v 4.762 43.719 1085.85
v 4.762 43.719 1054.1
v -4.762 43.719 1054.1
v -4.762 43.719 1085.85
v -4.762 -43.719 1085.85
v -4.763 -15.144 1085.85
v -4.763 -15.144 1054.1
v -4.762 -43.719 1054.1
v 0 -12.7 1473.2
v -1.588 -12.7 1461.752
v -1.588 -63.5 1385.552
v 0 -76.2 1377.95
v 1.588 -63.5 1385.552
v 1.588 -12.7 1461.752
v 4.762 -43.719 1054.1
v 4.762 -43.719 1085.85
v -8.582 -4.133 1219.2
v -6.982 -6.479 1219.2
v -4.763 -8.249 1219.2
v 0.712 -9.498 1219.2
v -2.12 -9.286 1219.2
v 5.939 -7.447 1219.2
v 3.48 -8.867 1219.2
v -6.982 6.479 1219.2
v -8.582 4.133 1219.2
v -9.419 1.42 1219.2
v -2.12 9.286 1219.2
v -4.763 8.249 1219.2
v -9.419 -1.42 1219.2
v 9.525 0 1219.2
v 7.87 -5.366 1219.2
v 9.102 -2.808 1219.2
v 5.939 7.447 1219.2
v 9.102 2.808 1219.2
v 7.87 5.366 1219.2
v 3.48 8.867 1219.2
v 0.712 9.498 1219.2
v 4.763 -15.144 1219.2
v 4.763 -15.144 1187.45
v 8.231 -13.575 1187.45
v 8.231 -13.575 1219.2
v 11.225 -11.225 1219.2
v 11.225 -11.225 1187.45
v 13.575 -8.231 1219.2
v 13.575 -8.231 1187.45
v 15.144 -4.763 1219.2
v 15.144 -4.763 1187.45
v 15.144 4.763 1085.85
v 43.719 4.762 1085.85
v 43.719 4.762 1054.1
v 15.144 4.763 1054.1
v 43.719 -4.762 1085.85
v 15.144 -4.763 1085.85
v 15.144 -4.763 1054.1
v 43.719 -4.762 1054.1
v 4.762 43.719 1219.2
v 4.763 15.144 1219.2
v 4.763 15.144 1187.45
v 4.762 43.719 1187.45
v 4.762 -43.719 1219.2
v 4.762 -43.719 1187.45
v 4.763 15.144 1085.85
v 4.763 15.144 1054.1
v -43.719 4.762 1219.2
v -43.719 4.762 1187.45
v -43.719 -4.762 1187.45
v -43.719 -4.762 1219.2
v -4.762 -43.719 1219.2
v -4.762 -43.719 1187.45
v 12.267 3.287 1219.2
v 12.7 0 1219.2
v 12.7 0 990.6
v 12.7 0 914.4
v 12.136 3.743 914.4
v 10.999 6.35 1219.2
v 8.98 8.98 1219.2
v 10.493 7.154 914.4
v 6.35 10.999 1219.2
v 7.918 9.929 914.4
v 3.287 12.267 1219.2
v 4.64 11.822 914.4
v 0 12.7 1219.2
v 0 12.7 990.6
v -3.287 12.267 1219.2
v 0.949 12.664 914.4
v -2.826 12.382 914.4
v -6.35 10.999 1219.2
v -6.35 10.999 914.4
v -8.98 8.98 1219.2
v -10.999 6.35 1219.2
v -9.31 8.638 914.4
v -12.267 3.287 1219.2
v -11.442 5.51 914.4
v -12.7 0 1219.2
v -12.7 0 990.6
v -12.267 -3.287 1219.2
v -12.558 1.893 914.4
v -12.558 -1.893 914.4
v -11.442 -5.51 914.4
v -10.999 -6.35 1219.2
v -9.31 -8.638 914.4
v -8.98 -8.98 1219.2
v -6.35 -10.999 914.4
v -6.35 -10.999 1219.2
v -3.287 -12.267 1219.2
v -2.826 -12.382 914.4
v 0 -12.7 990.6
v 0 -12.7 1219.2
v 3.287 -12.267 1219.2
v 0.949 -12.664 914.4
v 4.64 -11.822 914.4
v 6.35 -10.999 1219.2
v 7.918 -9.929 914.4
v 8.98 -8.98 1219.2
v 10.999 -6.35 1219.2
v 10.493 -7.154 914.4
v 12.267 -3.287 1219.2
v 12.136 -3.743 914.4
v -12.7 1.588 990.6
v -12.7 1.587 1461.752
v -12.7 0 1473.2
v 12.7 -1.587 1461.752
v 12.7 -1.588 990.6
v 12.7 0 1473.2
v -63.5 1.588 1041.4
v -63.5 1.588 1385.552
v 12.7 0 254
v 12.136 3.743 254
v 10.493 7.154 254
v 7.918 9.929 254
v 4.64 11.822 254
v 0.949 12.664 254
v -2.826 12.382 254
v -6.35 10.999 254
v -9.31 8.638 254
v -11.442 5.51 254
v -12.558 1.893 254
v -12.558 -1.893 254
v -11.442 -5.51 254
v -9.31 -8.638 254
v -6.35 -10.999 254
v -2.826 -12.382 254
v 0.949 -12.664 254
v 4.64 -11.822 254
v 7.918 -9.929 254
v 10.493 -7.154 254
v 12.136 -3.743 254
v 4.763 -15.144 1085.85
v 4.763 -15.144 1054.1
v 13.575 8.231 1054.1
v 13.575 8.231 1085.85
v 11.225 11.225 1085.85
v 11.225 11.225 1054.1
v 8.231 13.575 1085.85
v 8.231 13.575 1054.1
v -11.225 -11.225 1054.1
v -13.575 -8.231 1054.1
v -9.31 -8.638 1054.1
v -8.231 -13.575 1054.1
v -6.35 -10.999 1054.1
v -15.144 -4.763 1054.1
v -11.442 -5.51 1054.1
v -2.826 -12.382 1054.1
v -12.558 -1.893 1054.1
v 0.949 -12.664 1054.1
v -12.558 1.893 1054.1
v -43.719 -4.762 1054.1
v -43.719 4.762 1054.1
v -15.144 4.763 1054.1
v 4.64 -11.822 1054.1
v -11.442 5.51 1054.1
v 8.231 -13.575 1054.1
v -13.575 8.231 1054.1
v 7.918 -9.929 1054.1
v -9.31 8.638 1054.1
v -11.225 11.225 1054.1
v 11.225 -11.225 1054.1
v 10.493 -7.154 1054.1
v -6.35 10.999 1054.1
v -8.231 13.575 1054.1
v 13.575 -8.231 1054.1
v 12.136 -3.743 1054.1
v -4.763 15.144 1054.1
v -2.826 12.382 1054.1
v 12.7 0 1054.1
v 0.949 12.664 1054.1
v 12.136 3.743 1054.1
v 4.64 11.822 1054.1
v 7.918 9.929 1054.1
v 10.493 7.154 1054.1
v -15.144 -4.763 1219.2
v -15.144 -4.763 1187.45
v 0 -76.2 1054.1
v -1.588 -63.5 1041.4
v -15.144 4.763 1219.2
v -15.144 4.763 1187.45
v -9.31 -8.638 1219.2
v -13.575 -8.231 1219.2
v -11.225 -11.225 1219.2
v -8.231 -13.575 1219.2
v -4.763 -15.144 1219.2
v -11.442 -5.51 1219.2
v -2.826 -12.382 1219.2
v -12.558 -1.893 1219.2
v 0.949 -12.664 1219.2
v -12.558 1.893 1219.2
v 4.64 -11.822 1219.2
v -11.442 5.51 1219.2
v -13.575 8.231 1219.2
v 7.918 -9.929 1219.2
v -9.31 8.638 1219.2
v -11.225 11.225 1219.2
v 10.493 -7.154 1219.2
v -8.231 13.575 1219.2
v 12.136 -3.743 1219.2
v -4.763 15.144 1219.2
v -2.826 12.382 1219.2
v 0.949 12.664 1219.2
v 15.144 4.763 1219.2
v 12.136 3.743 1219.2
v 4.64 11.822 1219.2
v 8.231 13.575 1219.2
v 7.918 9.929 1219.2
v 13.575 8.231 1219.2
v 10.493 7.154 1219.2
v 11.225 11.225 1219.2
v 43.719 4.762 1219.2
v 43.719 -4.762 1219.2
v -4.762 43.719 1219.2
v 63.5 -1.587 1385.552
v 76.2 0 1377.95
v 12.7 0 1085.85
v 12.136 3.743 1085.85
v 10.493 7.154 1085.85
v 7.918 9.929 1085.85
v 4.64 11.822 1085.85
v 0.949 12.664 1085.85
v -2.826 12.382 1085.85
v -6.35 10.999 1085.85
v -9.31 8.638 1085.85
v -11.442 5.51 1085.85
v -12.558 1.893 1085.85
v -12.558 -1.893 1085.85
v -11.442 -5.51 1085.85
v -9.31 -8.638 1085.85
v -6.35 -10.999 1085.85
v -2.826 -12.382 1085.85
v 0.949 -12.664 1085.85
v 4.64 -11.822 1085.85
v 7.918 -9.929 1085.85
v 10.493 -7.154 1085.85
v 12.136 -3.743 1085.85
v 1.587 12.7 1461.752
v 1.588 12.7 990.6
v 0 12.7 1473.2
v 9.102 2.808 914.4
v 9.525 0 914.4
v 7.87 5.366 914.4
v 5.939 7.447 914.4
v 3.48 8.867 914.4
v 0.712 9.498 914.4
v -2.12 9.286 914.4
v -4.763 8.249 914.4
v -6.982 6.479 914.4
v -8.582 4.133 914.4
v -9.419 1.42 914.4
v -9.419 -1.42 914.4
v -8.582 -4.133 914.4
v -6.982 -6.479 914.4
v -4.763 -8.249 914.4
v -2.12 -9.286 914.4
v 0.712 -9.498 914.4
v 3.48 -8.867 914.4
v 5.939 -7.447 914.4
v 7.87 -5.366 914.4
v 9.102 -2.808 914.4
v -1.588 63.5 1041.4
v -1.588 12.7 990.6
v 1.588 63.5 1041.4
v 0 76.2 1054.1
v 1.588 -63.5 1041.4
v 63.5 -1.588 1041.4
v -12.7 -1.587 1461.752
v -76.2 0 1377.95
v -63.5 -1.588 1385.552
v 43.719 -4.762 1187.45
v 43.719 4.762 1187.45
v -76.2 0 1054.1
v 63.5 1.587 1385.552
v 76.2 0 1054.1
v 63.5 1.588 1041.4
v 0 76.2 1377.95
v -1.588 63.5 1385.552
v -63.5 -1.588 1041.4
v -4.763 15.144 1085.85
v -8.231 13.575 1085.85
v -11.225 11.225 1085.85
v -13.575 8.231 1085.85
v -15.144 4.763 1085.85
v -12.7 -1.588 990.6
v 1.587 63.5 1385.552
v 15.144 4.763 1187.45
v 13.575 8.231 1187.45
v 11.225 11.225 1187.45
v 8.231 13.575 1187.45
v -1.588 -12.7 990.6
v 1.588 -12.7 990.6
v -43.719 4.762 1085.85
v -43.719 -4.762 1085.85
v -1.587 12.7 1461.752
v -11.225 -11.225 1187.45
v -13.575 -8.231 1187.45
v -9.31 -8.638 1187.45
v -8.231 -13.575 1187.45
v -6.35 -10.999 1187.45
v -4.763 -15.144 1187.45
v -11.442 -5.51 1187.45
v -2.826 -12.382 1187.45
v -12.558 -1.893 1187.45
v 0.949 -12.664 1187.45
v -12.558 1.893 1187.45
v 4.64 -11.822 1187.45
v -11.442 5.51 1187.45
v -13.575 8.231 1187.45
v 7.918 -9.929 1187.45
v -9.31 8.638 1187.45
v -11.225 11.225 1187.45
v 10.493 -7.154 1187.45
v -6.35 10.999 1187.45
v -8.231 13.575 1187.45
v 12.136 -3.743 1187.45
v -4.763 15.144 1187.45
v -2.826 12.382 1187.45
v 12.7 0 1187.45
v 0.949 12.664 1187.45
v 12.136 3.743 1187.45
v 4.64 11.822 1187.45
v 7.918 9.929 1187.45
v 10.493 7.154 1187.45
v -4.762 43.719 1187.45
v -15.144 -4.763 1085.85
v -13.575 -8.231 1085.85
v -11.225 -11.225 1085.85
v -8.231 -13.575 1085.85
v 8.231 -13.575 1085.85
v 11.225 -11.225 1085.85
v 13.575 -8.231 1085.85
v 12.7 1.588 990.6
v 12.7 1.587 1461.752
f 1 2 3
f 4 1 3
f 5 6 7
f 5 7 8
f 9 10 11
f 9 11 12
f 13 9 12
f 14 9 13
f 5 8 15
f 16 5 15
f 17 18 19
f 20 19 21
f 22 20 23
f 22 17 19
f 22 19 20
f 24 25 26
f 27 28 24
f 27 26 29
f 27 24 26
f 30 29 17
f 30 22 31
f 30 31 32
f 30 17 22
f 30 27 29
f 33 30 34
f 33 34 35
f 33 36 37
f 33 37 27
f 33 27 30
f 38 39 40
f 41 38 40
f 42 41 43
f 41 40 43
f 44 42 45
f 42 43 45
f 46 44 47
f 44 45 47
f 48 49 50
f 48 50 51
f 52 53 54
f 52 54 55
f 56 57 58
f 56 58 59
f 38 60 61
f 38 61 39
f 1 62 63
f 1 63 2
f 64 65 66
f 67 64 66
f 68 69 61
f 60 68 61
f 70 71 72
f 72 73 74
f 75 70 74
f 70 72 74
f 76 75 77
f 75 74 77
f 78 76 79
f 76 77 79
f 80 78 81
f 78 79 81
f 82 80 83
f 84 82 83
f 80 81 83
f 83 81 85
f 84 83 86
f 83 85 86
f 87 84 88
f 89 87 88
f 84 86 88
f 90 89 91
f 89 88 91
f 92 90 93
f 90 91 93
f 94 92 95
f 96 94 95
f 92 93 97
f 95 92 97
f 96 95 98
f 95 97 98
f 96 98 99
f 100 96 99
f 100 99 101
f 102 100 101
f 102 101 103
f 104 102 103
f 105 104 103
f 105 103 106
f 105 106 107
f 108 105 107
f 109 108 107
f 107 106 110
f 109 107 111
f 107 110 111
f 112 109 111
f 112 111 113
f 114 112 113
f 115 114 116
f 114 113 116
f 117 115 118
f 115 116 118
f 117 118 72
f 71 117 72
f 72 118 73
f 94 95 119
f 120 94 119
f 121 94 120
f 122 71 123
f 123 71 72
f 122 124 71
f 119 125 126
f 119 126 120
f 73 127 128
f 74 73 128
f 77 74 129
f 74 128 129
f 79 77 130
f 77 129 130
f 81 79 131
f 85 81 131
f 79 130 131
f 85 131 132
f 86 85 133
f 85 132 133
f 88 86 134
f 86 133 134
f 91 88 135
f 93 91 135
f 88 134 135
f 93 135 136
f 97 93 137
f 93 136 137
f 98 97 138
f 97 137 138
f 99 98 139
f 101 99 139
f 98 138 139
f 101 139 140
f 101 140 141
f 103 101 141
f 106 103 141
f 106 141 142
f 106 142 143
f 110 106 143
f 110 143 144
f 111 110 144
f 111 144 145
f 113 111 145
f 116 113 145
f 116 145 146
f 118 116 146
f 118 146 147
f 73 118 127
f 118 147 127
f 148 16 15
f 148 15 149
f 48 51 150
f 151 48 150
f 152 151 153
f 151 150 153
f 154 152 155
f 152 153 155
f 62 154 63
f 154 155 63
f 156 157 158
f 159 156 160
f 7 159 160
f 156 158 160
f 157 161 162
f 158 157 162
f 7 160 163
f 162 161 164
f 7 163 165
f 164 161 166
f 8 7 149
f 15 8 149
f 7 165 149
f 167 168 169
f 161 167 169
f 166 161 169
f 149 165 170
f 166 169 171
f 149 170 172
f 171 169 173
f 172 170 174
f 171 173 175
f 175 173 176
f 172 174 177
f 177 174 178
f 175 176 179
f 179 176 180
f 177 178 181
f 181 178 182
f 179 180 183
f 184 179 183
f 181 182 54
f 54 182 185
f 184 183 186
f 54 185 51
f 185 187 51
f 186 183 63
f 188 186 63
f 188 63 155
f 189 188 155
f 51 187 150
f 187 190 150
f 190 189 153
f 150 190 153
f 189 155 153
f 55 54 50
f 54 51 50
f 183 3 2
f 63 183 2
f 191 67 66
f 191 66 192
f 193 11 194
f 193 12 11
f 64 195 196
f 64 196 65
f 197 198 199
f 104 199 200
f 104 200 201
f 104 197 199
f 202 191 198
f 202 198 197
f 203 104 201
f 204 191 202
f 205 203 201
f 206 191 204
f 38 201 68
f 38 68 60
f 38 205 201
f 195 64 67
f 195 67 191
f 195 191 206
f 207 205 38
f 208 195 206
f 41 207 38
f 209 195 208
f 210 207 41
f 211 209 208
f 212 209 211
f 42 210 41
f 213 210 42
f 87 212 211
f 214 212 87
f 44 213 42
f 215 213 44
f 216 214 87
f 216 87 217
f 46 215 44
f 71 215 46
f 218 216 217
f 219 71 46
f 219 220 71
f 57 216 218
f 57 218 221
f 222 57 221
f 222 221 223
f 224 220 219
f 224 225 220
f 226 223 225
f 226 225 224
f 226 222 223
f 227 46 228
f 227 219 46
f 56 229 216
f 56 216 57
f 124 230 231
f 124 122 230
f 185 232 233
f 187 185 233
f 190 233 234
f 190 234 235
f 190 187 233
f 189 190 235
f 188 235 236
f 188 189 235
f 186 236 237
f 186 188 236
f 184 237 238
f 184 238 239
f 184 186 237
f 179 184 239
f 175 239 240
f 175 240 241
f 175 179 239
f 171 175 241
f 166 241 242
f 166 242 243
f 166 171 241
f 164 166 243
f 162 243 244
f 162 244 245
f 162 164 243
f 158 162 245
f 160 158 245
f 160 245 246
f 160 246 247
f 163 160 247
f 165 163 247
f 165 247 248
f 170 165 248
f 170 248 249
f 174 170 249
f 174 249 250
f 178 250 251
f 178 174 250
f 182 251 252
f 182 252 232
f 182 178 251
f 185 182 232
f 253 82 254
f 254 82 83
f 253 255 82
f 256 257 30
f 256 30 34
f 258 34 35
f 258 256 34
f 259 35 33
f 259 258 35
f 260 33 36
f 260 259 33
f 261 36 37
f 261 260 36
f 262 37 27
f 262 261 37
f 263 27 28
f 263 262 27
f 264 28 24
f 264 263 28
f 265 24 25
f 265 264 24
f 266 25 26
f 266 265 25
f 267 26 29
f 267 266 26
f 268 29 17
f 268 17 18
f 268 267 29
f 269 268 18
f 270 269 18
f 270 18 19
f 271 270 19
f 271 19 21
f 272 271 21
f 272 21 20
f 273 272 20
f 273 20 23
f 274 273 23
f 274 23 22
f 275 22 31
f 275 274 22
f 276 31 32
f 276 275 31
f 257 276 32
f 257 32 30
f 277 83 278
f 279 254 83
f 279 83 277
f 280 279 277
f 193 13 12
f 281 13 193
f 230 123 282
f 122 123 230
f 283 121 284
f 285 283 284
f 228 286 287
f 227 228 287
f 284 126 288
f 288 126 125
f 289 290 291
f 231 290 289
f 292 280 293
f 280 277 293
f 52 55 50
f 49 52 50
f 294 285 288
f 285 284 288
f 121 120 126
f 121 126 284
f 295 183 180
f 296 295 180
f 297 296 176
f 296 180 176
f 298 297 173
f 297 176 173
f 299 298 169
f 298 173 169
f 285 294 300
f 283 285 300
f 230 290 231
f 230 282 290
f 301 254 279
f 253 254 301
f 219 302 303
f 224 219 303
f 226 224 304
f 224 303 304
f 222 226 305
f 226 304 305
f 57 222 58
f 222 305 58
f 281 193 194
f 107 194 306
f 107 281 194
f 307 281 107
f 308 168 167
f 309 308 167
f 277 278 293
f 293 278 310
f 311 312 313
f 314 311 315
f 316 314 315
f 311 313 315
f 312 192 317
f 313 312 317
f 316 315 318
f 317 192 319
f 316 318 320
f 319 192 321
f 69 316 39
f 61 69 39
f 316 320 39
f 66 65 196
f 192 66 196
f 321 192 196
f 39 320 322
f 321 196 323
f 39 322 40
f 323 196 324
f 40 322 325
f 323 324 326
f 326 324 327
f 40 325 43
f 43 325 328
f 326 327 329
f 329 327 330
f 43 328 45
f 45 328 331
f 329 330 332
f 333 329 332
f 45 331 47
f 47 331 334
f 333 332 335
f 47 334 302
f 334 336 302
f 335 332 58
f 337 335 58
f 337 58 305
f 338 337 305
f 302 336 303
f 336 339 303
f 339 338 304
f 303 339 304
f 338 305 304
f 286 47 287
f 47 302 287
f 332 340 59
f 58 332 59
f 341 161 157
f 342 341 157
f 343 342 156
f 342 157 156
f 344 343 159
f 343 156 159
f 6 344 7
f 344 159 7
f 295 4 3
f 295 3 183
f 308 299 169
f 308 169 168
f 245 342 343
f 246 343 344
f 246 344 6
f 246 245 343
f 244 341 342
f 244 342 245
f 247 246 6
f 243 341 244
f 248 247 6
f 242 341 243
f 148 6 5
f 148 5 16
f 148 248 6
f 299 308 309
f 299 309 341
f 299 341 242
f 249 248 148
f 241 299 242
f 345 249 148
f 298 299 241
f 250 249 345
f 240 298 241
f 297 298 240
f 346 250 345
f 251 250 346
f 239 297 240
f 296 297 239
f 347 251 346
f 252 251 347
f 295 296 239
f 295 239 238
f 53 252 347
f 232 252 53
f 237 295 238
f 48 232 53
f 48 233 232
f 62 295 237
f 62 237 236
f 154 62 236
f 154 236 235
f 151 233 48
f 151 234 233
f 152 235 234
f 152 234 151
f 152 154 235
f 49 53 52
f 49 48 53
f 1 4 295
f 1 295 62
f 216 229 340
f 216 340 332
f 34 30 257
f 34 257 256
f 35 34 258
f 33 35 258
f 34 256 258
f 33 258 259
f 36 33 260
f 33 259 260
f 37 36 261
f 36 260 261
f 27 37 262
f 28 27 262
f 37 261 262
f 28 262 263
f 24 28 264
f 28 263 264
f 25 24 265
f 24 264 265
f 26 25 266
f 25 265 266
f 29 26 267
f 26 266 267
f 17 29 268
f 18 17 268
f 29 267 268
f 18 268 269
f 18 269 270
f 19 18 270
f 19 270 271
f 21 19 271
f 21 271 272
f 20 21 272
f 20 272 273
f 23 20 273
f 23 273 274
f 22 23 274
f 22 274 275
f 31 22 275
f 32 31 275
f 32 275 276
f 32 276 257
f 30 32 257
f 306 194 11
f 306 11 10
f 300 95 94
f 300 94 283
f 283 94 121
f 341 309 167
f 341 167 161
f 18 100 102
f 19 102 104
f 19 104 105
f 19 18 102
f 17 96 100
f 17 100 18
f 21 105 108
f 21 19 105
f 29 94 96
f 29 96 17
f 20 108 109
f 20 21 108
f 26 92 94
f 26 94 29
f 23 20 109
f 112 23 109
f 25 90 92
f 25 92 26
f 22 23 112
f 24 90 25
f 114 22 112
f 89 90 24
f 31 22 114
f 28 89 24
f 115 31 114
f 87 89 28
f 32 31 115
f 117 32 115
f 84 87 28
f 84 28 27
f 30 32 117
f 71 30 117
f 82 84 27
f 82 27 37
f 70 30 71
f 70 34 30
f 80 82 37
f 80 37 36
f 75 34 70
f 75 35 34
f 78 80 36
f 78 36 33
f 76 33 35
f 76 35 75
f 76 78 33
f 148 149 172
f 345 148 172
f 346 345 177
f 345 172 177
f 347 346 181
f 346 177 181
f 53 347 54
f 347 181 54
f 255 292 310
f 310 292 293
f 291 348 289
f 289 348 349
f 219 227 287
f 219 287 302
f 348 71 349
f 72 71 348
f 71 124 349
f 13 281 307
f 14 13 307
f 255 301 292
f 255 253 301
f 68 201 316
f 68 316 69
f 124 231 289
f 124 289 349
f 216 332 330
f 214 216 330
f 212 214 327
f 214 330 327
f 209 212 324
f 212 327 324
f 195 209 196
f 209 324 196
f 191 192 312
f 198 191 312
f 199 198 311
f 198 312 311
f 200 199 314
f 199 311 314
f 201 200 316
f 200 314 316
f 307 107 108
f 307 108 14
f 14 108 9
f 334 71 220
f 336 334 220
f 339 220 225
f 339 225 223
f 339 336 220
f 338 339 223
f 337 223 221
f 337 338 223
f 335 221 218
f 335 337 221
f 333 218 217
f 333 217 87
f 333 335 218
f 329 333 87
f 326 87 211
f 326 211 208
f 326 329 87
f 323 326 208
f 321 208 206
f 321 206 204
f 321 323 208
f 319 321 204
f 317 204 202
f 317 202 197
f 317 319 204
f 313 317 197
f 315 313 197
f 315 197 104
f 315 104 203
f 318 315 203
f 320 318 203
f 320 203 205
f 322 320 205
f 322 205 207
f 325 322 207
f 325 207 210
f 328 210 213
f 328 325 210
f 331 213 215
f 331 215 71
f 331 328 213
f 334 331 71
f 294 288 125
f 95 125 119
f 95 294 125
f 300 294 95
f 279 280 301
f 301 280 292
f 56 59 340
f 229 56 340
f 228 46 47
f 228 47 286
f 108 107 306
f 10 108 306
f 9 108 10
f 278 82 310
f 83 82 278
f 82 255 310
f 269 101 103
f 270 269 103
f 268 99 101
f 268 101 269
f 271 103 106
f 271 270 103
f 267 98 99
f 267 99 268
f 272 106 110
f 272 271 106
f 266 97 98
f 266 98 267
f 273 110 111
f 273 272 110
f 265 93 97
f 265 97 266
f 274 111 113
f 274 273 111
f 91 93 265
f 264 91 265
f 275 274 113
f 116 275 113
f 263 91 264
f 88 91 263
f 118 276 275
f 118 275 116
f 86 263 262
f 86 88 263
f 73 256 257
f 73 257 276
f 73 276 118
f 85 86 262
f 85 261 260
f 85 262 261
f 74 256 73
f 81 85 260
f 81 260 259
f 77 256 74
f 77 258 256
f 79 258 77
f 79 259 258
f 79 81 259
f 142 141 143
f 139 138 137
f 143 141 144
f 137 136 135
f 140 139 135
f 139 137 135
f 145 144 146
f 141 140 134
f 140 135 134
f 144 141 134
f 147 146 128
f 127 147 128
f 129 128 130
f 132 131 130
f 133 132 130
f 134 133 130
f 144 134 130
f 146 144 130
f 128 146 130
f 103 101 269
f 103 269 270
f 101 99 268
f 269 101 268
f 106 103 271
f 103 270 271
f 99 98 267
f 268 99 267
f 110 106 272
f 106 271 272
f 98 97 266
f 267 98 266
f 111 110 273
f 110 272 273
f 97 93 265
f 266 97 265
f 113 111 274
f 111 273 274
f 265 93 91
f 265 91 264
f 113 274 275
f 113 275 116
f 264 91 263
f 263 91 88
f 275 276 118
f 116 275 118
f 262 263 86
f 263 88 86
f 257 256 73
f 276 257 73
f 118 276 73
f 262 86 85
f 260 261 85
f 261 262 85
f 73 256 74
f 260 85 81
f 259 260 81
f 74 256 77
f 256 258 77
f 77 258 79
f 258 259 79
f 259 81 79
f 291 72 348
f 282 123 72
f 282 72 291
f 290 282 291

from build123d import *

# Parameters (mm, degrees)
F1_START      = 254
F0_R          = 12.7
F0_R_2        = 9.525
F1_DEPTH      = 660.4
F2_START      = 254
F2_DEPTH      = 965.2
F3_START      = 914.4
F3_DEPTH      = 304.8
F5_DEPTH      = 1.5875
F5_DEPTH_BACK = 1.5875
F7_DEPTH      = 1.5875
F7_DEPTH_BACK = 1.5875
F9_START      = 1054.1
F8_R          = 12.7
F9_DEPTH      = 31.75
F10_START     = 1187.45
F10_DEPTH     = 31.75
F11_SIZE2     = 12.7
F11_SIZE      = 1.5875
F11_2_SIZE2   = 12.7
F11_2_SIZE    = 1.5875
F11_3_SIZE2   = 12.7
F11_3_SIZE    = 1.5875
F11_4_SIZE2   = 12.7
F11_4_SIZE    = 1.5875
F12_SIZE2     = 1.58749
F12_SIZE      = 12.69999
F12_2_SIZE2   = 1.58749
F12_2_SIZE    = 12.69999
F12_3_SIZE2   = 1.58749
F12_3_SIZE    = 12.69999
F12_4_SIZE2   = 1.58749
F12_4_SIZE    = 12.69999
F13_SIZE2     = 1.58749
F13_SIZE      = 6.34999
F13_2_SIZE2   = 1.5875
F13_2_SIZE    = 6.35
F13_3_SIZE2   = 1.58749
F13_3_SIZE    = 6.34999
F13_4_SIZE2   = 1.5875
F13_4_SIZE    = 6.35
F14_SIZE2     = 6.35
F14_SIZE      = 1.5875
F14_2_SIZE2   = 6.34999
F14_2_SIZE    = 1.58749
F14_3_SIZE2   = 6.35
F14_3_SIZE    = 1.5875
F14_4_SIZE2   = 6.34999
F14_4_SIZE    = 1.58749


# Not quite as in the source:
# - a fillet or chamfer is up to 0.001 mm smaller than in the source, because OpenCascade refuses the exact size


with BuildPart() as f1:
    # F0 (on Top) → F1 (new body)
    with BuildSketch(Plane.XY.offset(F1_START)):
        Circle(F0_R)
        Circle(F0_R_2, mode=Mode.SUBTRACT)
    extrude(amount=F1_DEPTH)

    # F0 (on Top) → F2 (join)
    with BuildSketch(Plane.XY.offset(F2_START)):
        Circle(F0_R_2)
    extrude(amount=F2_DEPTH)


with BuildPart() as f3:
    # F0 (on Top) → F3 (new body)
    with BuildSketch(Plane.XY.offset(F3_START)):
        Circle(F0_R)
        Circle(F0_R_2, mode=Mode.SUBTRACT)
    extrude(amount=F3_DEPTH)

    # F4 (on Front) → F5 (join, two sides)
    with BuildSketch(Plane.XZ) as f5_sk:
        Polygon((-12.7, 990.6), (-12.7, 1473.2), (-76.2, 1377.95), (-76.2, 1054.1), align=None)
        Polygon((76.2, 1377.95), (12.7, 1473.2), (12.7, 990.6), (76.2, 1054.1), align=None)
    extrude(amount=F5_DEPTH)
    extrude(f5_sk.sketch, amount=-F5_DEPTH_BACK)

    # F6 (on Right) → F7 (join, two sides)
    with BuildSketch(Plane.YZ) as f7_sk:
        Polygon((-76.2, 1054.1), (-12.7, 990.6), (-12.7, 1473.2), (-76.2, 1377.95), align=None)
        Polygon((12.7, 1473.2), (12.7, 990.6), (76.2, 1054.1), (76.2, 1377.95), align=None)
    extrude(amount=F7_DEPTH)
    extrude(f7_sk.sketch, amount=-F7_DEPTH_BACK)

    # F11
    f11_edges = [f3.edges().sort_by_distance(p)[0] for p in [
        (76.2, -1.5875, 1216.025),
    ]]
    f11_side = f3.faces().sort_by_distance((76.2, 0, 1216.025))[0]
    chamfer(f11_edges, length=F11_SIZE, length2=F11_SIZE2, reference=f11_side)

    # F11#2
    f11_2_edges = [f3.edges().sort_by_distance(p)[0] for p in [
        (1.5875, -76.2, 1216.025),
    ]]
    f11_2_side = f3.faces().sort_by_distance((0, -76.2, 1216.025))[0]
    chamfer(f11_2_edges, length=F11_2_SIZE, length2=F11_2_SIZE2, reference=f11_2_side)

    # F11#3
    f11_3_edges = [f3.edges().sort_by_distance(p)[0] for p in [
        (-76.2, 1.5875, 1216.025),
    ]]
    f11_3_side = f3.faces().sort_by_distance((-76.2, 0, 1216.025))[0]
    chamfer(f11_3_edges, length=F11_3_SIZE, length2=F11_3_SIZE2, reference=f11_3_side)

    # F11#4
    f11_4_edges = [f3.edges().sort_by_distance(p)[0] for p in [
        (-1.5875, 76.2, 1216.025),
    ]]
    f11_4_side = f3.faces().sort_by_distance((0, 76.2, 1216.025))[0]
    chamfer(f11_4_edges, length=F11_4_SIZE, length2=F11_4_SIZE2, reference=f11_4_side)

    # F12 (size 12.7 and 1.5875 in the source; OpenCascade refuses exactly that, so slightly less here)
    f12_edges = [f3.edges().sort_by_distance(p)[0] for p in [
        (-1.5875, -76.2, 1216.025),
    ]]
    f12_side = f3.faces().sort_by_distance((-1.5875, -42.366667, 1224.483333))[0]
    chamfer(f12_edges, length=F12_SIZE, length2=F12_SIZE2, reference=f12_side)

    # F12#2 (size 12.7 and 1.5875 in the source; OpenCascade refuses exactly that, so slightly less here)
    f12_2_edges = [f3.edges().sort_by_distance(p)[0] for p in [
        (-76.2, -1.5875, 1216.025),
    ]]
    f12_2_side = f3.faces().sort_by_distance((-42.366667, -1.5875, 1224.483333))[0]
    chamfer(f12_2_edges, length=F12_2_SIZE, length2=F12_2_SIZE2, reference=f12_2_side)

    # F12#3 (size 12.7 and 1.5875 in the source; OpenCascade refuses exactly that, so slightly less here)
    f12_3_edges = [f3.edges().sort_by_distance(p)[0] for p in [
        (1.5875, 76.2, 1216.025),
    ]]
    f12_3_side = f3.faces().sort_by_distance((1.5875, 42.366667, 1224.483333))[0]
    chamfer(f12_3_edges, length=F12_3_SIZE, length2=F12_3_SIZE2, reference=f12_3_side)

    # F12#4 (size 12.7 and 1.5875 in the source; OpenCascade refuses exactly that, so slightly less here)
    f12_4_edges = [f3.edges().sort_by_distance(p)[0] for p in [
        (76.2, 1.5875, 1216.025),
    ]]
    f12_4_side = f3.faces().sort_by_distance((42.366667, 1.5875, 1224.483333))[0]
    chamfer(f12_4_edges, length=F12_4_SIZE, length2=F12_4_SIZE2, reference=f12_4_side)

    # F13 (size 6.35 and 1.5875 in the source; OpenCascade refuses exactly that, so slightly less here)
    f13_edges = [f3.edges().sort_by_distance(p)[0] for p in [
        (38.100005, 1.5875, 1435.099993),
    ]]
    f13_side = f3.faces().sort_by_distance((36.817176, 1.5875, 1225.870706))[0]
    chamfer(f13_edges, length=F13_SIZE, length2=F13_SIZE2, reference=f13_side)

    # F13#2
    f13_2_edges = [f3.edges().sort_by_distance(p)[0] for p in [
        (-1.5875, 38.1, 1435.1),
    ]]
    f13_2_side = f3.faces().sort_by_distance((-1.5875, 36.817172, 1225.870707))[0]
    chamfer(f13_2_edges, length=F13_2_SIZE, length2=F13_2_SIZE2, reference=f13_2_side)

    # F13#3 (size 6.35 and 1.5875 in the source; OpenCascade refuses exactly that, so slightly less here)
    f13_3_edges = [f3.edges().sort_by_distance(p)[0] for p in [
        (-38.100005, -1.5875, 1435.099993),
    ]]
    f13_3_side = f3.faces().sort_by_distance((-36.817176, -1.5875, 1225.870706))[0]
    chamfer(f13_3_edges, length=F13_3_SIZE, length2=F13_3_SIZE2, reference=f13_3_side)

    # F13#4
    f13_4_edges = [f3.edges().sort_by_distance(p)[0] for p in [
        (1.5875, -38.1, 1435.1),
    ]]
    f13_4_side = f3.faces().sort_by_distance((1.5875, -36.817172, 1225.870707))[0]
    chamfer(f13_4_edges, length=F13_4_SIZE, length2=F13_4_SIZE2, reference=f13_4_side)

    # F14
    f14_edges = [f3.edges().sort_by_distance(p)[0] for p in [
        (38.1, -1.5875, 1435.1),
    ]]
    f14_side = f3.faces().sort_by_distance((41.392614, -0.764347, 1430.161079))[0]
    chamfer(f14_edges, length=F14_SIZE, length2=F14_SIZE2, reference=f14_side)

    # F14#2 (size 1.5875 and 6.35 in the source; OpenCascade refuses exactly that, so slightly less here)
    f14_2_edges = [f3.edges().sort_by_distance(p)[0] for p in [
        (-1.5875, -38.100005, 1435.099993),
    ]]
    f14_2_side = f3.faces().sort_by_distance((-0.764352, -41.392616, 1430.161076))[0]
    chamfer(f14_2_edges, length=F14_2_SIZE, length2=F14_2_SIZE2, reference=f14_2_side)

    # F14#3
    f14_3_edges = [f3.edges().sort_by_distance(p)[0] for p in [
        (-38.1, 1.5875, 1435.1),
    ]]
    f14_3_side = f3.faces().sort_by_distance((-41.392614, 0.764347, 1430.161079))[0]
    chamfer(f14_3_edges, length=F14_3_SIZE, length2=F14_3_SIZE2, reference=f14_3_side)

    # F14#4 (size 1.5875 and 6.35 in the source; OpenCascade refuses exactly that, so slightly less here)
    f14_4_edges = [f3.edges().sort_by_distance(p)[0] for p in [
        (1.5875, 38.100005, 1435.099993),
    ]]
    f14_4_side = f3.faces().sort_by_distance((0.764352, 41.392616, 1430.161076))[0]
    chamfer(f14_4_edges, length=F14_4_SIZE, length2=F14_4_SIZE2, reference=f14_4_side)


with BuildPart() as f9:
    # F8 (on Top) → F9 (new body)
    with BuildSketch(Plane.XY.offset(F9_START)):
        with BuildLine():
            Line((43.7187848225, 4.7625), (15.1437848225, 4.7625))
            ThreePointArc((15.1437848225, 4.7625), (11.2253201513, 11.2253201513), (4.7625, 15.1437848225))
            Line((4.7625, 15.1437848225), (4.7625, 43.7187848225))
            Line((4.7625, 43.7187848225), (-4.7625, 43.7187848225))
            Line((-4.7625, 43.7187848225), (-4.7625, 15.1437848225))
            ThreePointArc((-4.7625, 15.1437848225), (-11.2253201513, 11.2253201513), (-15.1437848225, 4.7625))
            Line((-15.1437848225, 4.7625), (-43.7187848225, 4.7625))
            Line((-43.7187848225, 4.7625), (-43.7187848225, -4.7625))
            Line((-43.7187848225, -4.7625), (-15.1437848225, -4.7625))
            ThreePointArc((-15.1437848225, -4.7625), (-11.2253201513, -11.2253201513), (-4.7625, -15.1437848225))
            Line((-4.7625, -15.1437848225), (-4.7625, -43.7187848225))
            Line((-4.7625, -43.7187848225), (4.7625, -43.7187848225))
            Line((4.7625, -43.7187848225), (4.7625, -15.1437848225))
            ThreePointArc((4.7625, -15.1437848225), (11.2253201513, -11.2253201513), (15.1437848225, -4.7625))
            Line((15.1437848225, -4.7625), (43.7187848225, -4.7625))
            Line((43.7187848225, -4.7625), (43.7187848225, 4.7625))
        make_face()
        Circle(F8_R, mode=Mode.SUBTRACT)
    extrude(amount=F9_DEPTH)


with BuildPart() as f10:
    # F8 (on Top) → F10 (new body)
    with BuildSketch(Plane.XY.offset(F10_START)):
        with BuildLine():
            Line((43.7187848225, 4.7625), (15.1437848225, 4.7625))
            ThreePointArc((15.1437848225, 4.7625), (11.2253201513, 11.2253201513), (4.7625, 15.1437848225))
            Line((4.7625, 15.1437848225), (4.7625, 43.7187848225))
            Line((4.7625, 43.7187848225), (-4.7625, 43.7187848225))
            Line((-4.7625, 43.7187848225), (-4.7625, 15.1437848225))
            ThreePointArc((-4.7625, 15.1437848225), (-11.2253201513, 11.2253201513), (-15.1437848225, 4.7625))
            Line((-15.1437848225, 4.7625), (-43.7187848225, 4.7625))
            Line((-43.7187848225, 4.7625), (-43.7187848225, -4.7625))
            Line((-43.7187848225, -4.7625), (-15.1437848225, -4.7625))
            ThreePointArc((-15.1437848225, -4.7625), (-11.2253201513, -11.2253201513), (-4.7625, -15.1437848225))
            Line((-4.7625, -15.1437848225), (-4.7625, -43.7187848225))
            Line((-4.7625, -43.7187848225), (4.7625, -43.7187848225))
            Line((4.7625, -43.7187848225), (4.7625, -15.1437848225))
            ThreePointArc((4.7625, -15.1437848225), (11.2253201513, -11.2253201513), (15.1437848225, -4.7625))
            Line((15.1437848225, -4.7625), (43.7187848225, -4.7625))
            Line((43.7187848225, -4.7625), (43.7187848225, 4.7625))
        make_face()
        Circle(F8_R, mode=Mode.SUBTRACT)
    extrude(amount=F10_DEPTH)


solid = Compound([f1.part, f3.part, f9.part, f10.part])
